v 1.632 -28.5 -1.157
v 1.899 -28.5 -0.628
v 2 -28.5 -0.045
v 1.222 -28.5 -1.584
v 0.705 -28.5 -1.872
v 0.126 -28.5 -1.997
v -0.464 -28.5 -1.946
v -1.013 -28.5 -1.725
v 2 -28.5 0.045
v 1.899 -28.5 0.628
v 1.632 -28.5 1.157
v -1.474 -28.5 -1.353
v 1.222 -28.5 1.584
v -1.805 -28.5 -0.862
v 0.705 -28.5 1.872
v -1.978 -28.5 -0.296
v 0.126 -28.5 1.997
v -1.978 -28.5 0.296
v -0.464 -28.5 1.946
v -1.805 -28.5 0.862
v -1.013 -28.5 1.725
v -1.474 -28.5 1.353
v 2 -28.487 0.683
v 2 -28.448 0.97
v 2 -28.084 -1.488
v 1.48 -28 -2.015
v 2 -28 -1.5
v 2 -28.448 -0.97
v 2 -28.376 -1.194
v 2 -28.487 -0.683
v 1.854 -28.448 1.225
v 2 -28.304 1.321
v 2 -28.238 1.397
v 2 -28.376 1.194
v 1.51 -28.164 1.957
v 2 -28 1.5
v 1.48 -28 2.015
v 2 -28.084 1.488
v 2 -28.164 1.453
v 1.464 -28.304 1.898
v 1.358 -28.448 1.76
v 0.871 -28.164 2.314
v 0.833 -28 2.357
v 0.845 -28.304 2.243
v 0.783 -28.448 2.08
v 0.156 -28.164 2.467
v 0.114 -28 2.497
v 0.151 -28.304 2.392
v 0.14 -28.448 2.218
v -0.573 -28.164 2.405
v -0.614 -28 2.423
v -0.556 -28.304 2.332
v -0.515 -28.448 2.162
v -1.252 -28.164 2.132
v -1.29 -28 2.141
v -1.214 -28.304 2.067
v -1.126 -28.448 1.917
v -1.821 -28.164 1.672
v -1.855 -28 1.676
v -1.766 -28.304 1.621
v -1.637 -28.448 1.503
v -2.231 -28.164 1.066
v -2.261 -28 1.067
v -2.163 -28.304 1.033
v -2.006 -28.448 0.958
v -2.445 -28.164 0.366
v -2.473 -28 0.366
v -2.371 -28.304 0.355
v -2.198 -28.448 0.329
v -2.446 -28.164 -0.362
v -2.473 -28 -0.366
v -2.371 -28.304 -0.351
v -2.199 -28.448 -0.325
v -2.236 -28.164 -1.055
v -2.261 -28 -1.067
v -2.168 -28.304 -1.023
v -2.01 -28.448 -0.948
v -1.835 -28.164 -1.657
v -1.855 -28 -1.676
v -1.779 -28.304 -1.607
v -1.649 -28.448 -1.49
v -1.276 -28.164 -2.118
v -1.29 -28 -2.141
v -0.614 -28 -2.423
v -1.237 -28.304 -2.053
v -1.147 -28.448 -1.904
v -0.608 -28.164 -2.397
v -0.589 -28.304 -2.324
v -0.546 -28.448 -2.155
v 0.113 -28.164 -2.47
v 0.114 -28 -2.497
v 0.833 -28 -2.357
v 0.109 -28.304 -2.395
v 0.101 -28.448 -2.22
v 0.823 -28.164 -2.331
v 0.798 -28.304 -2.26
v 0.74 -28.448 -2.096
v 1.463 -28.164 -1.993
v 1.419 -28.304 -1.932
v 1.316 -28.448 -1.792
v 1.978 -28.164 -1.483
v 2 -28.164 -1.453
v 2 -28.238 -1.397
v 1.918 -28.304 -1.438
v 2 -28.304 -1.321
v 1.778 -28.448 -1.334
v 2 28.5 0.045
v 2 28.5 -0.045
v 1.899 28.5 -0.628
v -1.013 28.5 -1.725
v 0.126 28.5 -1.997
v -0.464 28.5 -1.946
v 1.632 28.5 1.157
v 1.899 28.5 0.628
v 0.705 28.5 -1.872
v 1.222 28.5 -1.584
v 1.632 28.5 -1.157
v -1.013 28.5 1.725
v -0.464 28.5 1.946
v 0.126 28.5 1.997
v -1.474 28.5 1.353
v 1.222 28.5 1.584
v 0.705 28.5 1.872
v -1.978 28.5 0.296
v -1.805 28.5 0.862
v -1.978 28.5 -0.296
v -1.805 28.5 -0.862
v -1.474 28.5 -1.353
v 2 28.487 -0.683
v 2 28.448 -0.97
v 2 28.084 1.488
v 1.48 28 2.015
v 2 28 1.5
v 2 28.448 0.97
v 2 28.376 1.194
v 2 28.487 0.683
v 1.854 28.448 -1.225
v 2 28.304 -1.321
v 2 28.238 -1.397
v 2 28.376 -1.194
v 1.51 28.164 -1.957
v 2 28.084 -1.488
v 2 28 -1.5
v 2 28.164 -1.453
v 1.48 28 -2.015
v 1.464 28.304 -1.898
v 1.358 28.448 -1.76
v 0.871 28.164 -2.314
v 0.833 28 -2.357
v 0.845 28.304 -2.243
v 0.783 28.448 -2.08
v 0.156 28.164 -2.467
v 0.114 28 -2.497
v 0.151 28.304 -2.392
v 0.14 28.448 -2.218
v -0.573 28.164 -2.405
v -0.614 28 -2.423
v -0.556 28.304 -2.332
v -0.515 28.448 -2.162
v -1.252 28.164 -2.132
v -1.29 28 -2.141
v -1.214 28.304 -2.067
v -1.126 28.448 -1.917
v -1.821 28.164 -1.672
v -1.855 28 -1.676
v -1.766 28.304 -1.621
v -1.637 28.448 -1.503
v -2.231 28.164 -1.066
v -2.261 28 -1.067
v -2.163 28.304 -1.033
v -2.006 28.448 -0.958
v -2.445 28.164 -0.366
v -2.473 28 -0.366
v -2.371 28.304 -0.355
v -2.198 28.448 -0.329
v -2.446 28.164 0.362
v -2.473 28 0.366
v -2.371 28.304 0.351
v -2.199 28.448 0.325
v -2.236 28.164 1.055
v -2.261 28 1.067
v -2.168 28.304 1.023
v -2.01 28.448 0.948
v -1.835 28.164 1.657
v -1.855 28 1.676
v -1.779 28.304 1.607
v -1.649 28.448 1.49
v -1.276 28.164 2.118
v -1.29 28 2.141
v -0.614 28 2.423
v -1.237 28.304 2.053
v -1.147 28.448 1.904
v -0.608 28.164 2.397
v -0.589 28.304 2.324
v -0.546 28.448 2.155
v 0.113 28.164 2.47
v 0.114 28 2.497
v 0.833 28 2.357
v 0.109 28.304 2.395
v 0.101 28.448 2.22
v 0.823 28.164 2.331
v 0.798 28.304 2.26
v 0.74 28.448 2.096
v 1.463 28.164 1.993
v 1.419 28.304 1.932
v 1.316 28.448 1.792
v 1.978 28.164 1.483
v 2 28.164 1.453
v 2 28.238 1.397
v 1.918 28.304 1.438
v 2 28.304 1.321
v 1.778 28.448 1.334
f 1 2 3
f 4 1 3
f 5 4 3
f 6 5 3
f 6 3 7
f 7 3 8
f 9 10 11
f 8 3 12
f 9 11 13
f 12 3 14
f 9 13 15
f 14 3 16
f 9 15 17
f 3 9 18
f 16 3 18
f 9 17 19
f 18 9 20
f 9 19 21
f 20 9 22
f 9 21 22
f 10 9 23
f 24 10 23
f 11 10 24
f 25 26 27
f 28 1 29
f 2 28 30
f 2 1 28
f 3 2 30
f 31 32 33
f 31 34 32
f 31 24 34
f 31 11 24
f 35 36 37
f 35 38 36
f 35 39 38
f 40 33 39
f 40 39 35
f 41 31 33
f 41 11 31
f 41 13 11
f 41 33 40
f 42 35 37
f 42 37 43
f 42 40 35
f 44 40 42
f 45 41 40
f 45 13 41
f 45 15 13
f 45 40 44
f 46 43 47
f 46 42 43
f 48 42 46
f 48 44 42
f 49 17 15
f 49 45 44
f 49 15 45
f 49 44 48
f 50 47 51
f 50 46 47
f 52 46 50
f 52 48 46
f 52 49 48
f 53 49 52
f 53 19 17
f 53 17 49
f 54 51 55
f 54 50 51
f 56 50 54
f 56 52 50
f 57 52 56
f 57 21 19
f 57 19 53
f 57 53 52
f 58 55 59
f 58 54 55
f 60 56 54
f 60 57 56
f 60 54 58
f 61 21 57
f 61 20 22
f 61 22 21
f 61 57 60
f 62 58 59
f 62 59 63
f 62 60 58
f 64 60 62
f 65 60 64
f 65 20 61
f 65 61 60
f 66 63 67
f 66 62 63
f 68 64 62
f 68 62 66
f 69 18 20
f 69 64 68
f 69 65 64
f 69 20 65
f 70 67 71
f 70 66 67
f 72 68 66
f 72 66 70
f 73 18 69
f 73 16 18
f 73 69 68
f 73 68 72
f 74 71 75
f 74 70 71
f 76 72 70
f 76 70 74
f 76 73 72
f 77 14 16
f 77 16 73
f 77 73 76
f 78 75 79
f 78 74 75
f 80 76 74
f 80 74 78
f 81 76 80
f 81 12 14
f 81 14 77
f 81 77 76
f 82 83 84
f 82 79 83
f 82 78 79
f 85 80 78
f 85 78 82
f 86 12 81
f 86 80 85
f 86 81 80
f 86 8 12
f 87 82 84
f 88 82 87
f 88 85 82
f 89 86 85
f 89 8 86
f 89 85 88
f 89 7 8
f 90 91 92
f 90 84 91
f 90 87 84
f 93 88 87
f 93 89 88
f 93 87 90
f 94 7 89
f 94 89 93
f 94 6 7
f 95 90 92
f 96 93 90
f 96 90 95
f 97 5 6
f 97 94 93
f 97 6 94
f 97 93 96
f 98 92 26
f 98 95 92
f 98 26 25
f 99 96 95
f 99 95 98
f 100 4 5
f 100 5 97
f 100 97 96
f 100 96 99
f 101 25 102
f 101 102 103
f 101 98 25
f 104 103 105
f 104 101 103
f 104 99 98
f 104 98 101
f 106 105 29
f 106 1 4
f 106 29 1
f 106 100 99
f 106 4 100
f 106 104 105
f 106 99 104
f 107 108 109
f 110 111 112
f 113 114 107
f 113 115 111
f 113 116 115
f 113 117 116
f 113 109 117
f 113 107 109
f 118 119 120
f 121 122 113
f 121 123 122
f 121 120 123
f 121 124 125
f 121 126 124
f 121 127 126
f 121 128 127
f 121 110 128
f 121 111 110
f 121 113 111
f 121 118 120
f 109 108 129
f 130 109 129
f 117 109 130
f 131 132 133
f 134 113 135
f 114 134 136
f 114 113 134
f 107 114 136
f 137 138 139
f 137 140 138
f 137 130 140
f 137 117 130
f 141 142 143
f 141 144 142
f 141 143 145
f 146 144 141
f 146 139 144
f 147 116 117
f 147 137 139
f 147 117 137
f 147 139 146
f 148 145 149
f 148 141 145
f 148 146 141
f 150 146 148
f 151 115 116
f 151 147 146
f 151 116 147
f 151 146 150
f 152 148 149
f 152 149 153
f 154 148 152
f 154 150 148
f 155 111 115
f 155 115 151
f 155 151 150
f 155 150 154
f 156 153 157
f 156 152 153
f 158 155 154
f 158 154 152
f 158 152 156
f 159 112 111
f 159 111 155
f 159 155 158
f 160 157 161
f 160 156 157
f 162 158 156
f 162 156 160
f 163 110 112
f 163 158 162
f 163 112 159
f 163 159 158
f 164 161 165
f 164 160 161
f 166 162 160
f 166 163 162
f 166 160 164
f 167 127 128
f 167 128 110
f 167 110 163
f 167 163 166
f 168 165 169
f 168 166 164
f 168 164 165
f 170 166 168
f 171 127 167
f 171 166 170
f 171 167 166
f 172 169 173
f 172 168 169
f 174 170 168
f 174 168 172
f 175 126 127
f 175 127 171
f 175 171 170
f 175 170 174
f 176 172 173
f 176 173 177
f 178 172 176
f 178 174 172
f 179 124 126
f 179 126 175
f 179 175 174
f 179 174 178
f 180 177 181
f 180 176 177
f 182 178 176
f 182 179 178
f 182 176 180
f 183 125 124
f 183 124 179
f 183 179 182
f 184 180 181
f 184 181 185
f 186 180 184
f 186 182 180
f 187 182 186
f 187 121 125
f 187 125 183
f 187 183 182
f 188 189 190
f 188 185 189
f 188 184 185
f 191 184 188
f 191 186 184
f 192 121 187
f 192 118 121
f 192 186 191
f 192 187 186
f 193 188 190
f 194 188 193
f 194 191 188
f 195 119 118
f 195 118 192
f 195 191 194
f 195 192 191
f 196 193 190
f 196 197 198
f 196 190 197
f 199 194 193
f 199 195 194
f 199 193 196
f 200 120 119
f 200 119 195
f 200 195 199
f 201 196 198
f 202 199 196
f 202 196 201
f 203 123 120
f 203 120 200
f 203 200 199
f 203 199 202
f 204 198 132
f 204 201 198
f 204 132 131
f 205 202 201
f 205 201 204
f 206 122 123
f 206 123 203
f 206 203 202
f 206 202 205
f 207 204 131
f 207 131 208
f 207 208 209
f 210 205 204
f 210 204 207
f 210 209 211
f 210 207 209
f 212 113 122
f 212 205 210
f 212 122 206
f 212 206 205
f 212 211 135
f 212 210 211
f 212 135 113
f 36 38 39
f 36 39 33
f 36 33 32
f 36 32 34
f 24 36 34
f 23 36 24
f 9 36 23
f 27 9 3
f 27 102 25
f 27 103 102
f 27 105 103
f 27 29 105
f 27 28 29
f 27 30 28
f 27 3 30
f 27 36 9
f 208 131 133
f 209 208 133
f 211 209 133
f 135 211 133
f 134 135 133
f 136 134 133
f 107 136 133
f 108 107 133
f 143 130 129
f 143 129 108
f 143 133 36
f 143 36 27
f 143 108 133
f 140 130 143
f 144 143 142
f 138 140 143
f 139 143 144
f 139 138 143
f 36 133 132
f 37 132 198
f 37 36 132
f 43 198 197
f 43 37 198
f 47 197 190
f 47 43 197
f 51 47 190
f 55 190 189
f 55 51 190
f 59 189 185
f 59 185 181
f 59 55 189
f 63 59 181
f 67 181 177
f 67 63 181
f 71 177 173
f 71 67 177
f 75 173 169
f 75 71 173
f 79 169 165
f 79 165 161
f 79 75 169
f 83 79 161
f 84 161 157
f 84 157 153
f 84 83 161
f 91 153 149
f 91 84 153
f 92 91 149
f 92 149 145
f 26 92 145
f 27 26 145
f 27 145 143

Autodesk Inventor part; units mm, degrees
ref_plane "YZ Plane" through (0, 0, 0) normal (1, 0, 0) x (0, 1, 0)
ref_plane "XZ Plane" through (0, 0, 0) normal (0, 1, 0) x (-1, 0, 0)
ref_plane "XY Plane" through (0, 0, 0) normal (0, 0, 1) x (1, 0, 0)
sketch "Sketch1" plane through (0, 0, 0) normal (0, 1, 0) x (-1, 0, 0)
  circle A0 centre (0, 0) radius 2.5
  dimension "d0" = 5
extrude "Extrusion1" add sketch "Sketch1" along normal mid plane 57
sketch "Sketch2" plane through (0, 28.5, 0) normal (0, 1, 0) x (1, 0, 0)
  circle A0 centre (0, 0) radius 2.5 projected
  line L0 (-2.5, 0) -> (2, 0) construction
  line L1 (2, -1.5) -> (2, 1.5)
  dimension "d3" = 4.5
extrude "Extrusion2" cut sketch "Sketch2" against normal through all contours A0 L1 picked at (2.0912, -0.3466)
fillet "Fillet1" radius 0.5 2 edges at (-2.5, 28.5, 0) (-2.5, -28.5, 0)
properties part number "Perno 5 mm"
